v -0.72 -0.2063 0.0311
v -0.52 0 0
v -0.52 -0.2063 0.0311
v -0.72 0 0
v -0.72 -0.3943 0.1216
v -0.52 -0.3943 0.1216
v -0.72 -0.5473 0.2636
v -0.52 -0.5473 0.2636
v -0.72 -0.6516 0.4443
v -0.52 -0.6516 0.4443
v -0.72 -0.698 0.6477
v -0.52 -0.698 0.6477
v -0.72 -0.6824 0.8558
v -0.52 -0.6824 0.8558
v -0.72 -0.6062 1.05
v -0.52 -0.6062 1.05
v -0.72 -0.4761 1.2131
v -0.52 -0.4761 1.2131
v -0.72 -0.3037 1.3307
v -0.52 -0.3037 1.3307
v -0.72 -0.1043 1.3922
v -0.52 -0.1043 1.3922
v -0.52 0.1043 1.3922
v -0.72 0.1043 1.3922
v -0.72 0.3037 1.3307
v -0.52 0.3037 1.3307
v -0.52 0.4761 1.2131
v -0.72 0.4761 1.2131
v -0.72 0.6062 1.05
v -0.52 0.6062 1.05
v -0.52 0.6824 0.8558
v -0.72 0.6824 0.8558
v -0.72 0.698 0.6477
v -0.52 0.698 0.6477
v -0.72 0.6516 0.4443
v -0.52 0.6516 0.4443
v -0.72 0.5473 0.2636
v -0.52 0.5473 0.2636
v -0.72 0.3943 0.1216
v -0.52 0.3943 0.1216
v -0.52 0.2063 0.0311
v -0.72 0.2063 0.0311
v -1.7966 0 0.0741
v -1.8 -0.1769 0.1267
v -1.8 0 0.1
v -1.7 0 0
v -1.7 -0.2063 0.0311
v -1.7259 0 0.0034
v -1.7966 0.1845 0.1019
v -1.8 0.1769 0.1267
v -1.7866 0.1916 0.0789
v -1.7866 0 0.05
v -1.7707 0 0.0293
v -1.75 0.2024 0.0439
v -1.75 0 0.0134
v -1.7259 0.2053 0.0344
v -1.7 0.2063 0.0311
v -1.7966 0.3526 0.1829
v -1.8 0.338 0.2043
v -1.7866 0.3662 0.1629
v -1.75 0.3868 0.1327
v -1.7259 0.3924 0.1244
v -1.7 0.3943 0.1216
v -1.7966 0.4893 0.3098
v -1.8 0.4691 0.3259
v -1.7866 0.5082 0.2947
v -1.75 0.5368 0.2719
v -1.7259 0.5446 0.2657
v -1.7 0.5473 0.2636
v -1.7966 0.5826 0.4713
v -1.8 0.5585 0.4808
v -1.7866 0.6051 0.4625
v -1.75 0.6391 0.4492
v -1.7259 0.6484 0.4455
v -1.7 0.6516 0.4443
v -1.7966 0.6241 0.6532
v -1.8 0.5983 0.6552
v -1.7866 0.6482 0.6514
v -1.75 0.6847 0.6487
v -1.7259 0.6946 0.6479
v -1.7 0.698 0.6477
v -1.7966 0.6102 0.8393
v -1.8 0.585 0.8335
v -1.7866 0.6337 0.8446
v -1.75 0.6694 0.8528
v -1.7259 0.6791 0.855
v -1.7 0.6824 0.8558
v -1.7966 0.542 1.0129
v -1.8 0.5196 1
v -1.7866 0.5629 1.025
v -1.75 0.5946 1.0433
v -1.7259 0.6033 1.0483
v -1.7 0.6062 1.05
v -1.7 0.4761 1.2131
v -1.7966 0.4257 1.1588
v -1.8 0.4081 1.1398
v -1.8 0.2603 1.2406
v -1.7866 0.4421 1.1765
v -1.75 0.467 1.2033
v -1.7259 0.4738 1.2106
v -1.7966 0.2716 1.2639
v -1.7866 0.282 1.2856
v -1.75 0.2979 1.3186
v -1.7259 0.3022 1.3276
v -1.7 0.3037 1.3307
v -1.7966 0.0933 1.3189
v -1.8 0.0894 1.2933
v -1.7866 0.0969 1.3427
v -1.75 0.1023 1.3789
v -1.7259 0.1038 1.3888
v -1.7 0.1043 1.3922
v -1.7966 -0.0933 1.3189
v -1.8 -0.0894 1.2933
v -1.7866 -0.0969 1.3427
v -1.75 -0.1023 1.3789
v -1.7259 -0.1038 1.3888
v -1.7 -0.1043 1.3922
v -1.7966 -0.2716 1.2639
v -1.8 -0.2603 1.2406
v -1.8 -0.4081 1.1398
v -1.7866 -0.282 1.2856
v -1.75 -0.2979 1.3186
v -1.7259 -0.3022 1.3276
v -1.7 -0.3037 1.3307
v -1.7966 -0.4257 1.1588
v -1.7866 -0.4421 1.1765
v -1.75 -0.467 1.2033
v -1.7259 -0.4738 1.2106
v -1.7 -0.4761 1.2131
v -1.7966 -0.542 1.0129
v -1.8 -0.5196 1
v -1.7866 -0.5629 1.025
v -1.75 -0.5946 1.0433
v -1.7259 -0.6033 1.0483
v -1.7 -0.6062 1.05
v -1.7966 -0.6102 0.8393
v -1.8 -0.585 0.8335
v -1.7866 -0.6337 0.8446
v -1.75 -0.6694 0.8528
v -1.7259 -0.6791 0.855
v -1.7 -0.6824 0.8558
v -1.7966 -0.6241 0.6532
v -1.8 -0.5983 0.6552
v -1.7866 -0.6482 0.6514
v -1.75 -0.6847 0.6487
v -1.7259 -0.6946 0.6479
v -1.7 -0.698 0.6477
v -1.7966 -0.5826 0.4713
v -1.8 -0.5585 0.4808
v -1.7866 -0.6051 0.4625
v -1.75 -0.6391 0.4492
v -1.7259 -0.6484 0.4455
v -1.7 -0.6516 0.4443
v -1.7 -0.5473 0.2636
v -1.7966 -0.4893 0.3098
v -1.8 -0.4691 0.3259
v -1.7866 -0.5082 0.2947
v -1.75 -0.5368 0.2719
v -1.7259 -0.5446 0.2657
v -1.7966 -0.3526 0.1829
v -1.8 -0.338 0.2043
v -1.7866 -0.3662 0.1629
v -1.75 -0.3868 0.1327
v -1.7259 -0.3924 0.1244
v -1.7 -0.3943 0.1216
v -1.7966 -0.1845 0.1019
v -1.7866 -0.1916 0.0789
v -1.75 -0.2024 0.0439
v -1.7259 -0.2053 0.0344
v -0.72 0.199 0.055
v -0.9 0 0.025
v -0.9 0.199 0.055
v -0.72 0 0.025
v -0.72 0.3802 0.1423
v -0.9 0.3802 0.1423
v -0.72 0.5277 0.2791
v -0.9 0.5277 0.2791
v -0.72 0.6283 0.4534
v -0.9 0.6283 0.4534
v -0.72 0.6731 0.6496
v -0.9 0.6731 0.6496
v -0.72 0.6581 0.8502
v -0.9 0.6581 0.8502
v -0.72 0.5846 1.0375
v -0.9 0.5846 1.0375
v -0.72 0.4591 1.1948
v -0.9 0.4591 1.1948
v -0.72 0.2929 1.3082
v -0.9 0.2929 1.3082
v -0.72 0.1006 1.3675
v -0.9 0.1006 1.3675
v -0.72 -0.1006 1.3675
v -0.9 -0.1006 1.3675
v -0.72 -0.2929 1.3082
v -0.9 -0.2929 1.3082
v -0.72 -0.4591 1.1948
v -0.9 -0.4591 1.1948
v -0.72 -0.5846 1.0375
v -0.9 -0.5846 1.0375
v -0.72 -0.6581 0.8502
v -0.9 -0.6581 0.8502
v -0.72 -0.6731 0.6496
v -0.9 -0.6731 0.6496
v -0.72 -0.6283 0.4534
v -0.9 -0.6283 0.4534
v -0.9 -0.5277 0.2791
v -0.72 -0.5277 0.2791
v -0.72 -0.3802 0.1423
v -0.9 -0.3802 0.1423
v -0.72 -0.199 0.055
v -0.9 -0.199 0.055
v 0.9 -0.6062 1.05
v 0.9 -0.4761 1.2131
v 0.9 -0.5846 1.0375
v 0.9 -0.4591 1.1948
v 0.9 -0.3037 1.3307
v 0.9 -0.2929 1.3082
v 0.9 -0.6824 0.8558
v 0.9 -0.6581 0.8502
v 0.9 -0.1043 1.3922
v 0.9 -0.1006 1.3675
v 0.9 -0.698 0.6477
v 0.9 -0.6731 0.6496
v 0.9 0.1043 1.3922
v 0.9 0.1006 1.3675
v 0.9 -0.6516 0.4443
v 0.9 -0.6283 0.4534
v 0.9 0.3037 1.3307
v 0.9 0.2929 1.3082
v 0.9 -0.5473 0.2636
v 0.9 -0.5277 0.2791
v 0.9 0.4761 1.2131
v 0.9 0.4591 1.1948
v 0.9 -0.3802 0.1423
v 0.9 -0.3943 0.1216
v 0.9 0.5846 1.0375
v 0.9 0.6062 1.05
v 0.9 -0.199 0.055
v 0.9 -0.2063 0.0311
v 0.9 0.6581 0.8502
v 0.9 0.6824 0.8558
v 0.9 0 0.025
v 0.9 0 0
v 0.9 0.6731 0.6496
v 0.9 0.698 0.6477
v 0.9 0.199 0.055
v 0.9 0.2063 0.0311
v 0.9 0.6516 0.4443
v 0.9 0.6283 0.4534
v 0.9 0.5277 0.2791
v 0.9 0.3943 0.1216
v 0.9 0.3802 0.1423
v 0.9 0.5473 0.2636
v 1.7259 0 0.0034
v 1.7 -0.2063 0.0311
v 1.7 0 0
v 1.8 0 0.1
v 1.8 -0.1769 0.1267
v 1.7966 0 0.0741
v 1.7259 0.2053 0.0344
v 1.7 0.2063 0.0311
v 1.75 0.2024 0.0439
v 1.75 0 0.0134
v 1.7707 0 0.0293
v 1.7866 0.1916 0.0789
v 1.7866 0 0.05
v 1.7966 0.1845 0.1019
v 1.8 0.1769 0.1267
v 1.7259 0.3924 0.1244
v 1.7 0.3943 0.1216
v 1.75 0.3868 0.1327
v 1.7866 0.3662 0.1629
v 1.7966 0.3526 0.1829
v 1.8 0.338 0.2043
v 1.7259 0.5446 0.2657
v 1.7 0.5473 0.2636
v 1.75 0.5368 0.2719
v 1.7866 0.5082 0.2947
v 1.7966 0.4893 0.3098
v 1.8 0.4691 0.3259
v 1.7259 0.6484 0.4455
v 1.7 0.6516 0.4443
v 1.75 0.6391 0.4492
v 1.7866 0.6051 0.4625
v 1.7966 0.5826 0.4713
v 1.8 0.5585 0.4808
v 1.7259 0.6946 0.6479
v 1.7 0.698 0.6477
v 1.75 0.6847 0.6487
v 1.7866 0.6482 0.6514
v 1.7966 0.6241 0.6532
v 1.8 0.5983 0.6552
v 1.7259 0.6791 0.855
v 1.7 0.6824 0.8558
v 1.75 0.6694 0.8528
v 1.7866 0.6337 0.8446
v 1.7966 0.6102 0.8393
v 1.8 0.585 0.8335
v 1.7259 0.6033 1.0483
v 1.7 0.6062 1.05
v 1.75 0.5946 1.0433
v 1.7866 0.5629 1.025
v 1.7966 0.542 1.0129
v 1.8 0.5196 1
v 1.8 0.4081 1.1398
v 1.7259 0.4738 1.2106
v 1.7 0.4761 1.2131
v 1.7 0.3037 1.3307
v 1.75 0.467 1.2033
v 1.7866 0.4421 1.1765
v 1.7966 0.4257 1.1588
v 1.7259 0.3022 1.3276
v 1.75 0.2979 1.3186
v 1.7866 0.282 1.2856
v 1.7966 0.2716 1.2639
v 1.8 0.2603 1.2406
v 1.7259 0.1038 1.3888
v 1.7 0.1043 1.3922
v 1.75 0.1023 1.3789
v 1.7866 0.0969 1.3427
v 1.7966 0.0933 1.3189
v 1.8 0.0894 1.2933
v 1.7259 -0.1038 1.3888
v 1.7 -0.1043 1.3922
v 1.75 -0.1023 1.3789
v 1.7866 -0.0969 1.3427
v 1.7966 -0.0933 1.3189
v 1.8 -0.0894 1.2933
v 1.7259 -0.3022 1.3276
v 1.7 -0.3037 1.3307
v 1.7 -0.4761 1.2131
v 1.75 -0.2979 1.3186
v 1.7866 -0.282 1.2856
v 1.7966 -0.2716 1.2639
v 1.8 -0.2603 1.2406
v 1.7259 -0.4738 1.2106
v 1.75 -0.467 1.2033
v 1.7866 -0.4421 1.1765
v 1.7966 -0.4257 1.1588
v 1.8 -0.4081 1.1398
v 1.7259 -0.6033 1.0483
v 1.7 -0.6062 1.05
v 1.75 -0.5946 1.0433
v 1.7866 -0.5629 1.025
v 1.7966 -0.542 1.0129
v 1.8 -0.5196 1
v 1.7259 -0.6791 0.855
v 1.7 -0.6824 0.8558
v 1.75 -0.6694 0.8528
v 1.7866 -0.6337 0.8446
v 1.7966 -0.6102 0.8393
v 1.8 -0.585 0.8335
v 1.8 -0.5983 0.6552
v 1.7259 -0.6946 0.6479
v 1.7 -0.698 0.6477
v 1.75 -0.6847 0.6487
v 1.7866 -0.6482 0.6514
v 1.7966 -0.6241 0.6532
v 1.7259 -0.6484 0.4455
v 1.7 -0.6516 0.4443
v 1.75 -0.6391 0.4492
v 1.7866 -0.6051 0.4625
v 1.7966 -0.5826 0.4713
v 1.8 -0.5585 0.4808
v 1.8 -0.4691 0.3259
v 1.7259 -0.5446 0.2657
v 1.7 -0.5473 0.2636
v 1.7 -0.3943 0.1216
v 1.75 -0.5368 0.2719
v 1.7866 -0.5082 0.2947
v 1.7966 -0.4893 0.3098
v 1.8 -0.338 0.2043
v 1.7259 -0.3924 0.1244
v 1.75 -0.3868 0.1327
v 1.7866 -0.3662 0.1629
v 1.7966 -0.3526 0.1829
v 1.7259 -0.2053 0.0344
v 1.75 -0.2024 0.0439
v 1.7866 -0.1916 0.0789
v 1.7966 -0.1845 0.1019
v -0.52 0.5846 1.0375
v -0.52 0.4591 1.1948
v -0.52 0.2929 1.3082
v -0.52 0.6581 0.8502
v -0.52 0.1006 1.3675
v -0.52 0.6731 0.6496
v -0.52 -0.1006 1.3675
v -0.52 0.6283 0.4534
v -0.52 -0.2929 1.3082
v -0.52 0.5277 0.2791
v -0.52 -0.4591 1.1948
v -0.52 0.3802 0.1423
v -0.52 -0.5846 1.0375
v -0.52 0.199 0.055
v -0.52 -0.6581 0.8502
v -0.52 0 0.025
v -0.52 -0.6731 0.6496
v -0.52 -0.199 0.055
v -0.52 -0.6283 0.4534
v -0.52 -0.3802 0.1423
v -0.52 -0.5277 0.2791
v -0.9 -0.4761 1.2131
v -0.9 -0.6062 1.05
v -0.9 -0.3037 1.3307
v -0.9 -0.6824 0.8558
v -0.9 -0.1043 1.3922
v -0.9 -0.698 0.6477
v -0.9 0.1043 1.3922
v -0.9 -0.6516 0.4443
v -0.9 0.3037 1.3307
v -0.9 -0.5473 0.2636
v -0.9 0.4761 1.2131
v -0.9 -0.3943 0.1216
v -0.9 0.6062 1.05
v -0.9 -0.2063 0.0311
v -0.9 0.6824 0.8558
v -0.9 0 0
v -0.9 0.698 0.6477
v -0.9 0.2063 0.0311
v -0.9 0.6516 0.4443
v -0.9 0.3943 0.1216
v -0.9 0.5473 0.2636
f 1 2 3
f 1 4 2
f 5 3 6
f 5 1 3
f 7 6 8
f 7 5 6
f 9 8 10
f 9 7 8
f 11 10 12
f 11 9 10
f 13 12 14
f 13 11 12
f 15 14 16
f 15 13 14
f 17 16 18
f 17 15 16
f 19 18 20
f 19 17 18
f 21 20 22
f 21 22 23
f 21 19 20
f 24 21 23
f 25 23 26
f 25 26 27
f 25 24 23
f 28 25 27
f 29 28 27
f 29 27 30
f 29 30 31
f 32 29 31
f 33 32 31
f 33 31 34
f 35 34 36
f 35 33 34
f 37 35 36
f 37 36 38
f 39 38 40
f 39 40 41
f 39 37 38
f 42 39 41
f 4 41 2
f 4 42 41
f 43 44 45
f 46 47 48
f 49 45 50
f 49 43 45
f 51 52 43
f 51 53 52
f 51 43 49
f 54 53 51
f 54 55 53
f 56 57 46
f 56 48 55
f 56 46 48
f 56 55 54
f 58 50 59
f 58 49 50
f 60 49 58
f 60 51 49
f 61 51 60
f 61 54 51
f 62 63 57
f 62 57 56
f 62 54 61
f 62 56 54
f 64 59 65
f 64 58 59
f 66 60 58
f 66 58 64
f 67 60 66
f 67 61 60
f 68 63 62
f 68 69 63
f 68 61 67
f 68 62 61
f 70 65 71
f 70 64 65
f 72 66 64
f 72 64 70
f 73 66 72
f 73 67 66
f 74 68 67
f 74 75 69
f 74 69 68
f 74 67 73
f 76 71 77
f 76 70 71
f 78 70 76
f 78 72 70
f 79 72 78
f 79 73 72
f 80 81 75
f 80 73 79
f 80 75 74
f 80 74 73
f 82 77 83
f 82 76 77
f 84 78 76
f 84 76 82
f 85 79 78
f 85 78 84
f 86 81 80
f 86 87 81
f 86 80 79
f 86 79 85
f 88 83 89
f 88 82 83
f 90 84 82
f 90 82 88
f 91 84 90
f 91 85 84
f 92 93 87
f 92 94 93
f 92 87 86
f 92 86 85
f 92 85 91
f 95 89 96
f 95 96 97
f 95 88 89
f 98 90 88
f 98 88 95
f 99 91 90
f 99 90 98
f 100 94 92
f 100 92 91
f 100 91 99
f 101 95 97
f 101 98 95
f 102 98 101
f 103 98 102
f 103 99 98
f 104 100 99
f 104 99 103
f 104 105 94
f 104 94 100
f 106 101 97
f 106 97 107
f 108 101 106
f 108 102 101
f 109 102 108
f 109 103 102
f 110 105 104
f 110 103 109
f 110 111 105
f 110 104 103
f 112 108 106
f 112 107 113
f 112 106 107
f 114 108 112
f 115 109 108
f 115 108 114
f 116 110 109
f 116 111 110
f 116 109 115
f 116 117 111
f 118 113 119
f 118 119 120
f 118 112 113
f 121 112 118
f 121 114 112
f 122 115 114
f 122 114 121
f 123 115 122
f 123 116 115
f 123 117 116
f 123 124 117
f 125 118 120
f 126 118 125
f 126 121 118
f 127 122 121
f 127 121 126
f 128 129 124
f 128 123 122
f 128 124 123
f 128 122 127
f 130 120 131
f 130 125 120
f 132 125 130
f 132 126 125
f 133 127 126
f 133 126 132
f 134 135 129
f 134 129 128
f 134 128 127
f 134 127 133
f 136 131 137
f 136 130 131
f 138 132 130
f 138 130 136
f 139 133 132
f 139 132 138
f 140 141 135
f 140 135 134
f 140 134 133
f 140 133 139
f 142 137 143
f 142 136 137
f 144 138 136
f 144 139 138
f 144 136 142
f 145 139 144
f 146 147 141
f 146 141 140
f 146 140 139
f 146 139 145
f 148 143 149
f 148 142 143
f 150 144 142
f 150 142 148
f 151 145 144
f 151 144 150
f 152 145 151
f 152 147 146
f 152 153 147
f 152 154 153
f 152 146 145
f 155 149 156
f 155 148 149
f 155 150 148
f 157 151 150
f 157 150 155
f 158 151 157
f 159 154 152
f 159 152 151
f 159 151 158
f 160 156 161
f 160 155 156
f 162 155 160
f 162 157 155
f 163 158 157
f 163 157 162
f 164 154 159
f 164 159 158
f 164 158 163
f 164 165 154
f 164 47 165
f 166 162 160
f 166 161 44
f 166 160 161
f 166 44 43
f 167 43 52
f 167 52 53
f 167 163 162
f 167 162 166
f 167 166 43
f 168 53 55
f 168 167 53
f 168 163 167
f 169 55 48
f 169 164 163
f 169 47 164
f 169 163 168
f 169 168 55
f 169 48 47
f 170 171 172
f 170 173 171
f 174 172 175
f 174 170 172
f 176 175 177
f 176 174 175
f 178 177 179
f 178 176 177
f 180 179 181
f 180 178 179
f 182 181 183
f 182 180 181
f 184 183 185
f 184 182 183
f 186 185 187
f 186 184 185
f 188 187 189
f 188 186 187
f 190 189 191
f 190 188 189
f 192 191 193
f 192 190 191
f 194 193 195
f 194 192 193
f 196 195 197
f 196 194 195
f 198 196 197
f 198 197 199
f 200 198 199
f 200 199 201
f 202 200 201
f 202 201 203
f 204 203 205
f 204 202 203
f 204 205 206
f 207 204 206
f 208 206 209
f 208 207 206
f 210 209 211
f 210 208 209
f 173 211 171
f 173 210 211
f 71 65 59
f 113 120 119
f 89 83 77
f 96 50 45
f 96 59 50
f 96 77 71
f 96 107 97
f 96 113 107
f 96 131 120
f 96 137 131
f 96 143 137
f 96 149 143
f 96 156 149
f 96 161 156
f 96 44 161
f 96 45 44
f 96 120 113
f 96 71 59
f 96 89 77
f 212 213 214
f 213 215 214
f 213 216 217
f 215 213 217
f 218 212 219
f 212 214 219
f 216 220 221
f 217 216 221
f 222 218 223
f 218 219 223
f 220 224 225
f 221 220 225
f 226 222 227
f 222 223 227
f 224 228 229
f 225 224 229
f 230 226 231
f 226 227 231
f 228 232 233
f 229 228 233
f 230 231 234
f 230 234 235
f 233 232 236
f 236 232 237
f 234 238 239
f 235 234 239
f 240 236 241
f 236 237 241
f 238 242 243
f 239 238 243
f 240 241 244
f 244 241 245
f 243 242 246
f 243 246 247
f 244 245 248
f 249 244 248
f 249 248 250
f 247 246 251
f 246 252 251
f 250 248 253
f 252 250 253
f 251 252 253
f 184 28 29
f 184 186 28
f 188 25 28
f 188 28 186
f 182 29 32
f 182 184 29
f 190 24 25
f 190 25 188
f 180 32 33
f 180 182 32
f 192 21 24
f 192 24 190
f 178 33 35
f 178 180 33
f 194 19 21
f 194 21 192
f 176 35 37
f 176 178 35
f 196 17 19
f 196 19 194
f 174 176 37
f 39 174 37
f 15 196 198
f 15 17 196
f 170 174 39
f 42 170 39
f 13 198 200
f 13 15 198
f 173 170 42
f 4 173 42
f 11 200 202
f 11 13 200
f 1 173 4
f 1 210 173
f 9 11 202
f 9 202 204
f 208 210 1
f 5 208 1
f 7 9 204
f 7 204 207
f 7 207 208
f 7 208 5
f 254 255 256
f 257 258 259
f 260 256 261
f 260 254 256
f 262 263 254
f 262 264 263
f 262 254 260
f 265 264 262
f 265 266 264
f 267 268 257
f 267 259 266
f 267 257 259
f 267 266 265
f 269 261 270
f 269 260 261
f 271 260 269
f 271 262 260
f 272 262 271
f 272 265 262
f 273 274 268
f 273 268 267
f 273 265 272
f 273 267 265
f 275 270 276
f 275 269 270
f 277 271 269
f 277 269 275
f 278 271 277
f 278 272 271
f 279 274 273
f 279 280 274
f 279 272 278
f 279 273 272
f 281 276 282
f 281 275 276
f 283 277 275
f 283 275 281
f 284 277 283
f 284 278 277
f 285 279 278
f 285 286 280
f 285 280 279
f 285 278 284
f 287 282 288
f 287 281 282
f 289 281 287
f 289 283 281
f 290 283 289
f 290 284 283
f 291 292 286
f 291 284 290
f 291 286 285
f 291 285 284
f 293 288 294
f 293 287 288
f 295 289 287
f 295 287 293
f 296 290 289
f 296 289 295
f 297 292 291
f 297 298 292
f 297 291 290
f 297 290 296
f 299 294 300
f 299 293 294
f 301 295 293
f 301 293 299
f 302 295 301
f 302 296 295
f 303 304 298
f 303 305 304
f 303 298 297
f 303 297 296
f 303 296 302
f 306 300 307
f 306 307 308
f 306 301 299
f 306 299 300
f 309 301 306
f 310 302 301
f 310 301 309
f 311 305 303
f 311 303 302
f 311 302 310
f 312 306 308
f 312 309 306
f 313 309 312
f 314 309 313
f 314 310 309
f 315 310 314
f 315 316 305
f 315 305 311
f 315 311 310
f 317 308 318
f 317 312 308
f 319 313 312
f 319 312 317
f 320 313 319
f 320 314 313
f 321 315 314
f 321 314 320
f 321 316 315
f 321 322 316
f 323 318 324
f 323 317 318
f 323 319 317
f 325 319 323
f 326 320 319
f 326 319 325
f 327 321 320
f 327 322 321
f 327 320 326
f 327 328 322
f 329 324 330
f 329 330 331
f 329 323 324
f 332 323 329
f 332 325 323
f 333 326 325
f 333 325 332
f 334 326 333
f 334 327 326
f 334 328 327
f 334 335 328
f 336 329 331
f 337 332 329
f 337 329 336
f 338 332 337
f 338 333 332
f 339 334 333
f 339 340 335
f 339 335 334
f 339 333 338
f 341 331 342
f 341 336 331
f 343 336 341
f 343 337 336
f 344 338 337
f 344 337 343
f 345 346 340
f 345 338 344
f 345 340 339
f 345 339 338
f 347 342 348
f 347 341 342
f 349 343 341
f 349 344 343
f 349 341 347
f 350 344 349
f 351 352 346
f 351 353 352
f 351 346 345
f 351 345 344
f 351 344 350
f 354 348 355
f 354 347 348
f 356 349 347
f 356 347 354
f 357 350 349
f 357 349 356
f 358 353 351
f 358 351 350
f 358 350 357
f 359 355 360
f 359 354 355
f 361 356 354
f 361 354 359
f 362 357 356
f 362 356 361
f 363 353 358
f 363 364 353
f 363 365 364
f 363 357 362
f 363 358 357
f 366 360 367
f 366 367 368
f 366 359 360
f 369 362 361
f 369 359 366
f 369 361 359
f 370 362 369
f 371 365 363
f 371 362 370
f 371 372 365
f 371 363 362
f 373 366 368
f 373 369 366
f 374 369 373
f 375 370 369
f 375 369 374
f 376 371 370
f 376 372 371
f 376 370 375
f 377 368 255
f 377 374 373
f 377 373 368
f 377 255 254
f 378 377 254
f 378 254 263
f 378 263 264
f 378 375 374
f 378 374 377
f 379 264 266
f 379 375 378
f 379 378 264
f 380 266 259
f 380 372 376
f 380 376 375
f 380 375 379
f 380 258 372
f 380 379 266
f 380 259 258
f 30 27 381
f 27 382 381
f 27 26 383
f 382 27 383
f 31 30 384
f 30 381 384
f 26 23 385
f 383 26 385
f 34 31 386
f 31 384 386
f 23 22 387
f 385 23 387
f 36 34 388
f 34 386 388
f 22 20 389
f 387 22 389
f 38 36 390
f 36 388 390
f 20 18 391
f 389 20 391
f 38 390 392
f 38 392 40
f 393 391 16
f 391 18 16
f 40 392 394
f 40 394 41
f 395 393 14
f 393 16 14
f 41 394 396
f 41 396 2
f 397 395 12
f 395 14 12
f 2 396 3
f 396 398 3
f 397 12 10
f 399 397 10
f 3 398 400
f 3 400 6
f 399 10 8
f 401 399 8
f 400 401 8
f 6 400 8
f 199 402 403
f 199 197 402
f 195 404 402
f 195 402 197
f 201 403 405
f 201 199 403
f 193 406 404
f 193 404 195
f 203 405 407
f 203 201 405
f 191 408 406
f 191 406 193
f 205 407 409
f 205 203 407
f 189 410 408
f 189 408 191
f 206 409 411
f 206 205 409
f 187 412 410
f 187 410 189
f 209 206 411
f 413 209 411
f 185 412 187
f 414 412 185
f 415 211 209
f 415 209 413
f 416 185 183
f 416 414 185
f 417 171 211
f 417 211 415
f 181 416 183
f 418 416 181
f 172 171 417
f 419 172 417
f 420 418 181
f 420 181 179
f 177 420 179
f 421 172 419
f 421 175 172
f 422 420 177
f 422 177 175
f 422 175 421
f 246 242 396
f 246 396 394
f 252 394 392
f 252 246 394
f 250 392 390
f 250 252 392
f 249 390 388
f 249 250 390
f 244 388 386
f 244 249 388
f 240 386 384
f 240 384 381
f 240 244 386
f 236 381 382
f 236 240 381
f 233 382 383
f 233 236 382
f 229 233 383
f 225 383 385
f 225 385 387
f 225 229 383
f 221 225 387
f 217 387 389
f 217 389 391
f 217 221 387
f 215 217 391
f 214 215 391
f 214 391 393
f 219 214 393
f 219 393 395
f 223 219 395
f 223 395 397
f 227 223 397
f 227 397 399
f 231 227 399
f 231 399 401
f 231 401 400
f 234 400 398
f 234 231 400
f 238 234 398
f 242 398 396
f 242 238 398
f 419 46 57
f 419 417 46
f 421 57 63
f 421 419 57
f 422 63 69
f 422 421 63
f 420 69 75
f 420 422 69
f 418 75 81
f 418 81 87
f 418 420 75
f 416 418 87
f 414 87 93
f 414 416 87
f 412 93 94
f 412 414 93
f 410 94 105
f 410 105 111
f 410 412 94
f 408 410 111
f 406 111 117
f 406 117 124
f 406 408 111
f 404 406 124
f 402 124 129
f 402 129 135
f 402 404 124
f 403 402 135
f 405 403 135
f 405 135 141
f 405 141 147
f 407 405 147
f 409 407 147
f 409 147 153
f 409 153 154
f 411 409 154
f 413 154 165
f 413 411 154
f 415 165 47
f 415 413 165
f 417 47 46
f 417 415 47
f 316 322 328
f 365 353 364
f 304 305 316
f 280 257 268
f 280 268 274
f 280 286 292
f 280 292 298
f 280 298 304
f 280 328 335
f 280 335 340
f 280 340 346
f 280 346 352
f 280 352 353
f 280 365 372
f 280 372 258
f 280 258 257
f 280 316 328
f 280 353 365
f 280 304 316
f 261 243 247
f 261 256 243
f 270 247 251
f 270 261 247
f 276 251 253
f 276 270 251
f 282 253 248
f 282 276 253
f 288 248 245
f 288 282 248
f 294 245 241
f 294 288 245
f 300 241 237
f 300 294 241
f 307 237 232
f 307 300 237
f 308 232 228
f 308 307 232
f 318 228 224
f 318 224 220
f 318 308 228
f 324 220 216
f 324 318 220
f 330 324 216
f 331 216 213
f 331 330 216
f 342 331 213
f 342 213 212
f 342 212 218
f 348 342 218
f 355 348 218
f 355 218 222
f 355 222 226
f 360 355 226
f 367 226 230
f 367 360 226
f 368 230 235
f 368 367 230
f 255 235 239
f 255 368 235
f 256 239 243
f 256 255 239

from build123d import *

# Parameters (mm, degrees)
SKETCH002_W = 0.2
SKETCH002_H = 0.05
SKETCH_W    = 2.7
SKETCH_H    = 0.675


with BuildPart() as revolution002:
    # Sketch002 → Revolution002 (revolve)
    with BuildSketch(Plane(origin=(0, 0, 0), x_dir=(-1, 0, 0), z_dir=(0, 1, 0))):
        with Locations((0.62, 0.025)):
            Rectangle(SKETCH002_W, SKETCH002_H)
    revolve(axis=Axis((1.725436, 0, 0.7), (-1, 0, 0)))


with BuildPart() as revolution001:
    # Sketch001 → Revolution001 (revolve)
    with BuildSketch(Plane.XZ):
        with BuildLine():
            Line((-1.7, 0), (-0.9, 0))
            Line((-0.9, 0), (-0.9, 0.19375))
            Line((-0.9, 0.19375), (0.9, 0.19375))
            Line((0.9, 0), (0.9, 0.19375))
            Line((0.9, 0), (1.7, 0))
            ThreePointArc((1.7, 0), (1.770711, 0.029289), (1.8, 0.1))
            Line((1.8, 0.1), (1.8, 0.7))
            Line((-1.8, 0.7), (1.8, 0.7))
            Line((-1.8, 0.7), (-1.8, 0.1))
            ThreePointArc((-1.8, 0.1), (-1.770711, 0.029289), (-1.7, 0))
        make_face()
    revolve(axis=Axis((-8.2, 0, 0.7), (1, 0, 0)))


with BuildPart() as d_minimelf_standard:
    # Sketch → Revolution (revolve)
    with BuildSketch(Plane.XZ):
        with Locations((0, 0.3625)):
            Rectangle(SKETCH_W, SKETCH_H)
    revolve(axis=Axis((-15.061842, 0, 0.7), (1, 0, 0)))

    # Fusion: union Revolution002, Revolution001
    add(revolution002.part)
    add(revolution001.part)


solid = d_minimelf_standard.part
